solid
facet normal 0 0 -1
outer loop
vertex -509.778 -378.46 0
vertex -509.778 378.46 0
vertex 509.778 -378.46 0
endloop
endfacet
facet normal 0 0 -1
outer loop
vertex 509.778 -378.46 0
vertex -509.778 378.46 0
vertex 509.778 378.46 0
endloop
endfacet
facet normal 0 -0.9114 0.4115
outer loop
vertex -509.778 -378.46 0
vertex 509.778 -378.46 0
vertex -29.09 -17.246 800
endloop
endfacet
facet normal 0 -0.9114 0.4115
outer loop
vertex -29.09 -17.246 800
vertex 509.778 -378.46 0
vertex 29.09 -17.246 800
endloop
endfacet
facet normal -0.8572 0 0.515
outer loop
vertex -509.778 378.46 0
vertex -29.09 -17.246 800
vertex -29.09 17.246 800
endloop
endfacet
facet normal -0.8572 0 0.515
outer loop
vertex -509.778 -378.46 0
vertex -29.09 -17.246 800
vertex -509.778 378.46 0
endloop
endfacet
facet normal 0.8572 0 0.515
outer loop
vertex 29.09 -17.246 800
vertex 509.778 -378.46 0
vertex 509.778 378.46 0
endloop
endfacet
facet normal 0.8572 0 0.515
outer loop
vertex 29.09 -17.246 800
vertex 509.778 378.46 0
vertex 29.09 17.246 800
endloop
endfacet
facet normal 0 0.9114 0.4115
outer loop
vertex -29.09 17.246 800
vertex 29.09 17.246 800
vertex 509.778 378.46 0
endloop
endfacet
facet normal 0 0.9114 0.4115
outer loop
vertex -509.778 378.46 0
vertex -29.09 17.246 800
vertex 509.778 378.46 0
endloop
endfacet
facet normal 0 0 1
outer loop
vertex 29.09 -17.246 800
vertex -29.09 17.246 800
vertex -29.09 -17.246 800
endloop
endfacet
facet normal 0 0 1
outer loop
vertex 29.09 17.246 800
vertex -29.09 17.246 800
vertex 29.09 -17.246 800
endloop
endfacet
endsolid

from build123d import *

# Parameters (mm, degrees)
SKETCH1_W               = 1019.556
SKETCH1_H               = 756.92
BOSS_EXTRUDE1_DEPTH     = 800
CUT_EXTRUDE1_DEPTH      = 1351.083852483
CUT_EXTRUDE2_DEPTH      = 1022.325404014
CUT_EXTRUDE2_DEPTH_BACK = 1022.325404014


with BuildPart() as part:
    # Sketch1 → Boss-Extrude1 (new body)
    with BuildSketch(Plane.XY):
        Rectangle(SKETCH1_W, SKETCH1_H)
    extrude(amount=BOSS_EXTRUDE1_DEPTH)

    # Sketch2 → Cut-Extrude1 (cut, through all)
    with BuildSketch(Plane(origin=(509.778, 0, 0), x_dir=(0, 0, -1), z_dir=(1, 0, 0))):
        Polygon((2016.625671317, 1289.001404615), (0, 378.46), (-838.195987242, 0), (0, -378.46), (2016.625671317, -1289.001404615), (-2408.694542061, -1289.001404615), (-2408.694542061, 1289.001404615), align=None)
    extrude(amount=-CUT_EXTRUDE1_DEPTH, mode=Mode.SUBTRACT)

    # Sketch4 → Cut-Extrude2 (cut, two sides: drawn at the far end of the back side and taken through both)
    with BuildSketch(Plane(origin=(0, 0, 0), x_dir=(1, 0, 0), z_dir=(0, 1, 0)).offset(-CUT_EXTRUDE2_DEPTH_BACK)):
        Polygon((-1849.85876024, 2230.26891396), (-509.778, 0), (0, -848.413065954), (509.778, 0), (1849.85876024, 2230.26891396), (1849.85876024, -2973.543485633), (-1849.85876024, -2973.543485633), align=None)
    extrude(amount=CUT_EXTRUDE2_DEPTH + CUT_EXTRUDE2_DEPTH_BACK, mode=Mode.SUBTRACT)


solid = part.part
